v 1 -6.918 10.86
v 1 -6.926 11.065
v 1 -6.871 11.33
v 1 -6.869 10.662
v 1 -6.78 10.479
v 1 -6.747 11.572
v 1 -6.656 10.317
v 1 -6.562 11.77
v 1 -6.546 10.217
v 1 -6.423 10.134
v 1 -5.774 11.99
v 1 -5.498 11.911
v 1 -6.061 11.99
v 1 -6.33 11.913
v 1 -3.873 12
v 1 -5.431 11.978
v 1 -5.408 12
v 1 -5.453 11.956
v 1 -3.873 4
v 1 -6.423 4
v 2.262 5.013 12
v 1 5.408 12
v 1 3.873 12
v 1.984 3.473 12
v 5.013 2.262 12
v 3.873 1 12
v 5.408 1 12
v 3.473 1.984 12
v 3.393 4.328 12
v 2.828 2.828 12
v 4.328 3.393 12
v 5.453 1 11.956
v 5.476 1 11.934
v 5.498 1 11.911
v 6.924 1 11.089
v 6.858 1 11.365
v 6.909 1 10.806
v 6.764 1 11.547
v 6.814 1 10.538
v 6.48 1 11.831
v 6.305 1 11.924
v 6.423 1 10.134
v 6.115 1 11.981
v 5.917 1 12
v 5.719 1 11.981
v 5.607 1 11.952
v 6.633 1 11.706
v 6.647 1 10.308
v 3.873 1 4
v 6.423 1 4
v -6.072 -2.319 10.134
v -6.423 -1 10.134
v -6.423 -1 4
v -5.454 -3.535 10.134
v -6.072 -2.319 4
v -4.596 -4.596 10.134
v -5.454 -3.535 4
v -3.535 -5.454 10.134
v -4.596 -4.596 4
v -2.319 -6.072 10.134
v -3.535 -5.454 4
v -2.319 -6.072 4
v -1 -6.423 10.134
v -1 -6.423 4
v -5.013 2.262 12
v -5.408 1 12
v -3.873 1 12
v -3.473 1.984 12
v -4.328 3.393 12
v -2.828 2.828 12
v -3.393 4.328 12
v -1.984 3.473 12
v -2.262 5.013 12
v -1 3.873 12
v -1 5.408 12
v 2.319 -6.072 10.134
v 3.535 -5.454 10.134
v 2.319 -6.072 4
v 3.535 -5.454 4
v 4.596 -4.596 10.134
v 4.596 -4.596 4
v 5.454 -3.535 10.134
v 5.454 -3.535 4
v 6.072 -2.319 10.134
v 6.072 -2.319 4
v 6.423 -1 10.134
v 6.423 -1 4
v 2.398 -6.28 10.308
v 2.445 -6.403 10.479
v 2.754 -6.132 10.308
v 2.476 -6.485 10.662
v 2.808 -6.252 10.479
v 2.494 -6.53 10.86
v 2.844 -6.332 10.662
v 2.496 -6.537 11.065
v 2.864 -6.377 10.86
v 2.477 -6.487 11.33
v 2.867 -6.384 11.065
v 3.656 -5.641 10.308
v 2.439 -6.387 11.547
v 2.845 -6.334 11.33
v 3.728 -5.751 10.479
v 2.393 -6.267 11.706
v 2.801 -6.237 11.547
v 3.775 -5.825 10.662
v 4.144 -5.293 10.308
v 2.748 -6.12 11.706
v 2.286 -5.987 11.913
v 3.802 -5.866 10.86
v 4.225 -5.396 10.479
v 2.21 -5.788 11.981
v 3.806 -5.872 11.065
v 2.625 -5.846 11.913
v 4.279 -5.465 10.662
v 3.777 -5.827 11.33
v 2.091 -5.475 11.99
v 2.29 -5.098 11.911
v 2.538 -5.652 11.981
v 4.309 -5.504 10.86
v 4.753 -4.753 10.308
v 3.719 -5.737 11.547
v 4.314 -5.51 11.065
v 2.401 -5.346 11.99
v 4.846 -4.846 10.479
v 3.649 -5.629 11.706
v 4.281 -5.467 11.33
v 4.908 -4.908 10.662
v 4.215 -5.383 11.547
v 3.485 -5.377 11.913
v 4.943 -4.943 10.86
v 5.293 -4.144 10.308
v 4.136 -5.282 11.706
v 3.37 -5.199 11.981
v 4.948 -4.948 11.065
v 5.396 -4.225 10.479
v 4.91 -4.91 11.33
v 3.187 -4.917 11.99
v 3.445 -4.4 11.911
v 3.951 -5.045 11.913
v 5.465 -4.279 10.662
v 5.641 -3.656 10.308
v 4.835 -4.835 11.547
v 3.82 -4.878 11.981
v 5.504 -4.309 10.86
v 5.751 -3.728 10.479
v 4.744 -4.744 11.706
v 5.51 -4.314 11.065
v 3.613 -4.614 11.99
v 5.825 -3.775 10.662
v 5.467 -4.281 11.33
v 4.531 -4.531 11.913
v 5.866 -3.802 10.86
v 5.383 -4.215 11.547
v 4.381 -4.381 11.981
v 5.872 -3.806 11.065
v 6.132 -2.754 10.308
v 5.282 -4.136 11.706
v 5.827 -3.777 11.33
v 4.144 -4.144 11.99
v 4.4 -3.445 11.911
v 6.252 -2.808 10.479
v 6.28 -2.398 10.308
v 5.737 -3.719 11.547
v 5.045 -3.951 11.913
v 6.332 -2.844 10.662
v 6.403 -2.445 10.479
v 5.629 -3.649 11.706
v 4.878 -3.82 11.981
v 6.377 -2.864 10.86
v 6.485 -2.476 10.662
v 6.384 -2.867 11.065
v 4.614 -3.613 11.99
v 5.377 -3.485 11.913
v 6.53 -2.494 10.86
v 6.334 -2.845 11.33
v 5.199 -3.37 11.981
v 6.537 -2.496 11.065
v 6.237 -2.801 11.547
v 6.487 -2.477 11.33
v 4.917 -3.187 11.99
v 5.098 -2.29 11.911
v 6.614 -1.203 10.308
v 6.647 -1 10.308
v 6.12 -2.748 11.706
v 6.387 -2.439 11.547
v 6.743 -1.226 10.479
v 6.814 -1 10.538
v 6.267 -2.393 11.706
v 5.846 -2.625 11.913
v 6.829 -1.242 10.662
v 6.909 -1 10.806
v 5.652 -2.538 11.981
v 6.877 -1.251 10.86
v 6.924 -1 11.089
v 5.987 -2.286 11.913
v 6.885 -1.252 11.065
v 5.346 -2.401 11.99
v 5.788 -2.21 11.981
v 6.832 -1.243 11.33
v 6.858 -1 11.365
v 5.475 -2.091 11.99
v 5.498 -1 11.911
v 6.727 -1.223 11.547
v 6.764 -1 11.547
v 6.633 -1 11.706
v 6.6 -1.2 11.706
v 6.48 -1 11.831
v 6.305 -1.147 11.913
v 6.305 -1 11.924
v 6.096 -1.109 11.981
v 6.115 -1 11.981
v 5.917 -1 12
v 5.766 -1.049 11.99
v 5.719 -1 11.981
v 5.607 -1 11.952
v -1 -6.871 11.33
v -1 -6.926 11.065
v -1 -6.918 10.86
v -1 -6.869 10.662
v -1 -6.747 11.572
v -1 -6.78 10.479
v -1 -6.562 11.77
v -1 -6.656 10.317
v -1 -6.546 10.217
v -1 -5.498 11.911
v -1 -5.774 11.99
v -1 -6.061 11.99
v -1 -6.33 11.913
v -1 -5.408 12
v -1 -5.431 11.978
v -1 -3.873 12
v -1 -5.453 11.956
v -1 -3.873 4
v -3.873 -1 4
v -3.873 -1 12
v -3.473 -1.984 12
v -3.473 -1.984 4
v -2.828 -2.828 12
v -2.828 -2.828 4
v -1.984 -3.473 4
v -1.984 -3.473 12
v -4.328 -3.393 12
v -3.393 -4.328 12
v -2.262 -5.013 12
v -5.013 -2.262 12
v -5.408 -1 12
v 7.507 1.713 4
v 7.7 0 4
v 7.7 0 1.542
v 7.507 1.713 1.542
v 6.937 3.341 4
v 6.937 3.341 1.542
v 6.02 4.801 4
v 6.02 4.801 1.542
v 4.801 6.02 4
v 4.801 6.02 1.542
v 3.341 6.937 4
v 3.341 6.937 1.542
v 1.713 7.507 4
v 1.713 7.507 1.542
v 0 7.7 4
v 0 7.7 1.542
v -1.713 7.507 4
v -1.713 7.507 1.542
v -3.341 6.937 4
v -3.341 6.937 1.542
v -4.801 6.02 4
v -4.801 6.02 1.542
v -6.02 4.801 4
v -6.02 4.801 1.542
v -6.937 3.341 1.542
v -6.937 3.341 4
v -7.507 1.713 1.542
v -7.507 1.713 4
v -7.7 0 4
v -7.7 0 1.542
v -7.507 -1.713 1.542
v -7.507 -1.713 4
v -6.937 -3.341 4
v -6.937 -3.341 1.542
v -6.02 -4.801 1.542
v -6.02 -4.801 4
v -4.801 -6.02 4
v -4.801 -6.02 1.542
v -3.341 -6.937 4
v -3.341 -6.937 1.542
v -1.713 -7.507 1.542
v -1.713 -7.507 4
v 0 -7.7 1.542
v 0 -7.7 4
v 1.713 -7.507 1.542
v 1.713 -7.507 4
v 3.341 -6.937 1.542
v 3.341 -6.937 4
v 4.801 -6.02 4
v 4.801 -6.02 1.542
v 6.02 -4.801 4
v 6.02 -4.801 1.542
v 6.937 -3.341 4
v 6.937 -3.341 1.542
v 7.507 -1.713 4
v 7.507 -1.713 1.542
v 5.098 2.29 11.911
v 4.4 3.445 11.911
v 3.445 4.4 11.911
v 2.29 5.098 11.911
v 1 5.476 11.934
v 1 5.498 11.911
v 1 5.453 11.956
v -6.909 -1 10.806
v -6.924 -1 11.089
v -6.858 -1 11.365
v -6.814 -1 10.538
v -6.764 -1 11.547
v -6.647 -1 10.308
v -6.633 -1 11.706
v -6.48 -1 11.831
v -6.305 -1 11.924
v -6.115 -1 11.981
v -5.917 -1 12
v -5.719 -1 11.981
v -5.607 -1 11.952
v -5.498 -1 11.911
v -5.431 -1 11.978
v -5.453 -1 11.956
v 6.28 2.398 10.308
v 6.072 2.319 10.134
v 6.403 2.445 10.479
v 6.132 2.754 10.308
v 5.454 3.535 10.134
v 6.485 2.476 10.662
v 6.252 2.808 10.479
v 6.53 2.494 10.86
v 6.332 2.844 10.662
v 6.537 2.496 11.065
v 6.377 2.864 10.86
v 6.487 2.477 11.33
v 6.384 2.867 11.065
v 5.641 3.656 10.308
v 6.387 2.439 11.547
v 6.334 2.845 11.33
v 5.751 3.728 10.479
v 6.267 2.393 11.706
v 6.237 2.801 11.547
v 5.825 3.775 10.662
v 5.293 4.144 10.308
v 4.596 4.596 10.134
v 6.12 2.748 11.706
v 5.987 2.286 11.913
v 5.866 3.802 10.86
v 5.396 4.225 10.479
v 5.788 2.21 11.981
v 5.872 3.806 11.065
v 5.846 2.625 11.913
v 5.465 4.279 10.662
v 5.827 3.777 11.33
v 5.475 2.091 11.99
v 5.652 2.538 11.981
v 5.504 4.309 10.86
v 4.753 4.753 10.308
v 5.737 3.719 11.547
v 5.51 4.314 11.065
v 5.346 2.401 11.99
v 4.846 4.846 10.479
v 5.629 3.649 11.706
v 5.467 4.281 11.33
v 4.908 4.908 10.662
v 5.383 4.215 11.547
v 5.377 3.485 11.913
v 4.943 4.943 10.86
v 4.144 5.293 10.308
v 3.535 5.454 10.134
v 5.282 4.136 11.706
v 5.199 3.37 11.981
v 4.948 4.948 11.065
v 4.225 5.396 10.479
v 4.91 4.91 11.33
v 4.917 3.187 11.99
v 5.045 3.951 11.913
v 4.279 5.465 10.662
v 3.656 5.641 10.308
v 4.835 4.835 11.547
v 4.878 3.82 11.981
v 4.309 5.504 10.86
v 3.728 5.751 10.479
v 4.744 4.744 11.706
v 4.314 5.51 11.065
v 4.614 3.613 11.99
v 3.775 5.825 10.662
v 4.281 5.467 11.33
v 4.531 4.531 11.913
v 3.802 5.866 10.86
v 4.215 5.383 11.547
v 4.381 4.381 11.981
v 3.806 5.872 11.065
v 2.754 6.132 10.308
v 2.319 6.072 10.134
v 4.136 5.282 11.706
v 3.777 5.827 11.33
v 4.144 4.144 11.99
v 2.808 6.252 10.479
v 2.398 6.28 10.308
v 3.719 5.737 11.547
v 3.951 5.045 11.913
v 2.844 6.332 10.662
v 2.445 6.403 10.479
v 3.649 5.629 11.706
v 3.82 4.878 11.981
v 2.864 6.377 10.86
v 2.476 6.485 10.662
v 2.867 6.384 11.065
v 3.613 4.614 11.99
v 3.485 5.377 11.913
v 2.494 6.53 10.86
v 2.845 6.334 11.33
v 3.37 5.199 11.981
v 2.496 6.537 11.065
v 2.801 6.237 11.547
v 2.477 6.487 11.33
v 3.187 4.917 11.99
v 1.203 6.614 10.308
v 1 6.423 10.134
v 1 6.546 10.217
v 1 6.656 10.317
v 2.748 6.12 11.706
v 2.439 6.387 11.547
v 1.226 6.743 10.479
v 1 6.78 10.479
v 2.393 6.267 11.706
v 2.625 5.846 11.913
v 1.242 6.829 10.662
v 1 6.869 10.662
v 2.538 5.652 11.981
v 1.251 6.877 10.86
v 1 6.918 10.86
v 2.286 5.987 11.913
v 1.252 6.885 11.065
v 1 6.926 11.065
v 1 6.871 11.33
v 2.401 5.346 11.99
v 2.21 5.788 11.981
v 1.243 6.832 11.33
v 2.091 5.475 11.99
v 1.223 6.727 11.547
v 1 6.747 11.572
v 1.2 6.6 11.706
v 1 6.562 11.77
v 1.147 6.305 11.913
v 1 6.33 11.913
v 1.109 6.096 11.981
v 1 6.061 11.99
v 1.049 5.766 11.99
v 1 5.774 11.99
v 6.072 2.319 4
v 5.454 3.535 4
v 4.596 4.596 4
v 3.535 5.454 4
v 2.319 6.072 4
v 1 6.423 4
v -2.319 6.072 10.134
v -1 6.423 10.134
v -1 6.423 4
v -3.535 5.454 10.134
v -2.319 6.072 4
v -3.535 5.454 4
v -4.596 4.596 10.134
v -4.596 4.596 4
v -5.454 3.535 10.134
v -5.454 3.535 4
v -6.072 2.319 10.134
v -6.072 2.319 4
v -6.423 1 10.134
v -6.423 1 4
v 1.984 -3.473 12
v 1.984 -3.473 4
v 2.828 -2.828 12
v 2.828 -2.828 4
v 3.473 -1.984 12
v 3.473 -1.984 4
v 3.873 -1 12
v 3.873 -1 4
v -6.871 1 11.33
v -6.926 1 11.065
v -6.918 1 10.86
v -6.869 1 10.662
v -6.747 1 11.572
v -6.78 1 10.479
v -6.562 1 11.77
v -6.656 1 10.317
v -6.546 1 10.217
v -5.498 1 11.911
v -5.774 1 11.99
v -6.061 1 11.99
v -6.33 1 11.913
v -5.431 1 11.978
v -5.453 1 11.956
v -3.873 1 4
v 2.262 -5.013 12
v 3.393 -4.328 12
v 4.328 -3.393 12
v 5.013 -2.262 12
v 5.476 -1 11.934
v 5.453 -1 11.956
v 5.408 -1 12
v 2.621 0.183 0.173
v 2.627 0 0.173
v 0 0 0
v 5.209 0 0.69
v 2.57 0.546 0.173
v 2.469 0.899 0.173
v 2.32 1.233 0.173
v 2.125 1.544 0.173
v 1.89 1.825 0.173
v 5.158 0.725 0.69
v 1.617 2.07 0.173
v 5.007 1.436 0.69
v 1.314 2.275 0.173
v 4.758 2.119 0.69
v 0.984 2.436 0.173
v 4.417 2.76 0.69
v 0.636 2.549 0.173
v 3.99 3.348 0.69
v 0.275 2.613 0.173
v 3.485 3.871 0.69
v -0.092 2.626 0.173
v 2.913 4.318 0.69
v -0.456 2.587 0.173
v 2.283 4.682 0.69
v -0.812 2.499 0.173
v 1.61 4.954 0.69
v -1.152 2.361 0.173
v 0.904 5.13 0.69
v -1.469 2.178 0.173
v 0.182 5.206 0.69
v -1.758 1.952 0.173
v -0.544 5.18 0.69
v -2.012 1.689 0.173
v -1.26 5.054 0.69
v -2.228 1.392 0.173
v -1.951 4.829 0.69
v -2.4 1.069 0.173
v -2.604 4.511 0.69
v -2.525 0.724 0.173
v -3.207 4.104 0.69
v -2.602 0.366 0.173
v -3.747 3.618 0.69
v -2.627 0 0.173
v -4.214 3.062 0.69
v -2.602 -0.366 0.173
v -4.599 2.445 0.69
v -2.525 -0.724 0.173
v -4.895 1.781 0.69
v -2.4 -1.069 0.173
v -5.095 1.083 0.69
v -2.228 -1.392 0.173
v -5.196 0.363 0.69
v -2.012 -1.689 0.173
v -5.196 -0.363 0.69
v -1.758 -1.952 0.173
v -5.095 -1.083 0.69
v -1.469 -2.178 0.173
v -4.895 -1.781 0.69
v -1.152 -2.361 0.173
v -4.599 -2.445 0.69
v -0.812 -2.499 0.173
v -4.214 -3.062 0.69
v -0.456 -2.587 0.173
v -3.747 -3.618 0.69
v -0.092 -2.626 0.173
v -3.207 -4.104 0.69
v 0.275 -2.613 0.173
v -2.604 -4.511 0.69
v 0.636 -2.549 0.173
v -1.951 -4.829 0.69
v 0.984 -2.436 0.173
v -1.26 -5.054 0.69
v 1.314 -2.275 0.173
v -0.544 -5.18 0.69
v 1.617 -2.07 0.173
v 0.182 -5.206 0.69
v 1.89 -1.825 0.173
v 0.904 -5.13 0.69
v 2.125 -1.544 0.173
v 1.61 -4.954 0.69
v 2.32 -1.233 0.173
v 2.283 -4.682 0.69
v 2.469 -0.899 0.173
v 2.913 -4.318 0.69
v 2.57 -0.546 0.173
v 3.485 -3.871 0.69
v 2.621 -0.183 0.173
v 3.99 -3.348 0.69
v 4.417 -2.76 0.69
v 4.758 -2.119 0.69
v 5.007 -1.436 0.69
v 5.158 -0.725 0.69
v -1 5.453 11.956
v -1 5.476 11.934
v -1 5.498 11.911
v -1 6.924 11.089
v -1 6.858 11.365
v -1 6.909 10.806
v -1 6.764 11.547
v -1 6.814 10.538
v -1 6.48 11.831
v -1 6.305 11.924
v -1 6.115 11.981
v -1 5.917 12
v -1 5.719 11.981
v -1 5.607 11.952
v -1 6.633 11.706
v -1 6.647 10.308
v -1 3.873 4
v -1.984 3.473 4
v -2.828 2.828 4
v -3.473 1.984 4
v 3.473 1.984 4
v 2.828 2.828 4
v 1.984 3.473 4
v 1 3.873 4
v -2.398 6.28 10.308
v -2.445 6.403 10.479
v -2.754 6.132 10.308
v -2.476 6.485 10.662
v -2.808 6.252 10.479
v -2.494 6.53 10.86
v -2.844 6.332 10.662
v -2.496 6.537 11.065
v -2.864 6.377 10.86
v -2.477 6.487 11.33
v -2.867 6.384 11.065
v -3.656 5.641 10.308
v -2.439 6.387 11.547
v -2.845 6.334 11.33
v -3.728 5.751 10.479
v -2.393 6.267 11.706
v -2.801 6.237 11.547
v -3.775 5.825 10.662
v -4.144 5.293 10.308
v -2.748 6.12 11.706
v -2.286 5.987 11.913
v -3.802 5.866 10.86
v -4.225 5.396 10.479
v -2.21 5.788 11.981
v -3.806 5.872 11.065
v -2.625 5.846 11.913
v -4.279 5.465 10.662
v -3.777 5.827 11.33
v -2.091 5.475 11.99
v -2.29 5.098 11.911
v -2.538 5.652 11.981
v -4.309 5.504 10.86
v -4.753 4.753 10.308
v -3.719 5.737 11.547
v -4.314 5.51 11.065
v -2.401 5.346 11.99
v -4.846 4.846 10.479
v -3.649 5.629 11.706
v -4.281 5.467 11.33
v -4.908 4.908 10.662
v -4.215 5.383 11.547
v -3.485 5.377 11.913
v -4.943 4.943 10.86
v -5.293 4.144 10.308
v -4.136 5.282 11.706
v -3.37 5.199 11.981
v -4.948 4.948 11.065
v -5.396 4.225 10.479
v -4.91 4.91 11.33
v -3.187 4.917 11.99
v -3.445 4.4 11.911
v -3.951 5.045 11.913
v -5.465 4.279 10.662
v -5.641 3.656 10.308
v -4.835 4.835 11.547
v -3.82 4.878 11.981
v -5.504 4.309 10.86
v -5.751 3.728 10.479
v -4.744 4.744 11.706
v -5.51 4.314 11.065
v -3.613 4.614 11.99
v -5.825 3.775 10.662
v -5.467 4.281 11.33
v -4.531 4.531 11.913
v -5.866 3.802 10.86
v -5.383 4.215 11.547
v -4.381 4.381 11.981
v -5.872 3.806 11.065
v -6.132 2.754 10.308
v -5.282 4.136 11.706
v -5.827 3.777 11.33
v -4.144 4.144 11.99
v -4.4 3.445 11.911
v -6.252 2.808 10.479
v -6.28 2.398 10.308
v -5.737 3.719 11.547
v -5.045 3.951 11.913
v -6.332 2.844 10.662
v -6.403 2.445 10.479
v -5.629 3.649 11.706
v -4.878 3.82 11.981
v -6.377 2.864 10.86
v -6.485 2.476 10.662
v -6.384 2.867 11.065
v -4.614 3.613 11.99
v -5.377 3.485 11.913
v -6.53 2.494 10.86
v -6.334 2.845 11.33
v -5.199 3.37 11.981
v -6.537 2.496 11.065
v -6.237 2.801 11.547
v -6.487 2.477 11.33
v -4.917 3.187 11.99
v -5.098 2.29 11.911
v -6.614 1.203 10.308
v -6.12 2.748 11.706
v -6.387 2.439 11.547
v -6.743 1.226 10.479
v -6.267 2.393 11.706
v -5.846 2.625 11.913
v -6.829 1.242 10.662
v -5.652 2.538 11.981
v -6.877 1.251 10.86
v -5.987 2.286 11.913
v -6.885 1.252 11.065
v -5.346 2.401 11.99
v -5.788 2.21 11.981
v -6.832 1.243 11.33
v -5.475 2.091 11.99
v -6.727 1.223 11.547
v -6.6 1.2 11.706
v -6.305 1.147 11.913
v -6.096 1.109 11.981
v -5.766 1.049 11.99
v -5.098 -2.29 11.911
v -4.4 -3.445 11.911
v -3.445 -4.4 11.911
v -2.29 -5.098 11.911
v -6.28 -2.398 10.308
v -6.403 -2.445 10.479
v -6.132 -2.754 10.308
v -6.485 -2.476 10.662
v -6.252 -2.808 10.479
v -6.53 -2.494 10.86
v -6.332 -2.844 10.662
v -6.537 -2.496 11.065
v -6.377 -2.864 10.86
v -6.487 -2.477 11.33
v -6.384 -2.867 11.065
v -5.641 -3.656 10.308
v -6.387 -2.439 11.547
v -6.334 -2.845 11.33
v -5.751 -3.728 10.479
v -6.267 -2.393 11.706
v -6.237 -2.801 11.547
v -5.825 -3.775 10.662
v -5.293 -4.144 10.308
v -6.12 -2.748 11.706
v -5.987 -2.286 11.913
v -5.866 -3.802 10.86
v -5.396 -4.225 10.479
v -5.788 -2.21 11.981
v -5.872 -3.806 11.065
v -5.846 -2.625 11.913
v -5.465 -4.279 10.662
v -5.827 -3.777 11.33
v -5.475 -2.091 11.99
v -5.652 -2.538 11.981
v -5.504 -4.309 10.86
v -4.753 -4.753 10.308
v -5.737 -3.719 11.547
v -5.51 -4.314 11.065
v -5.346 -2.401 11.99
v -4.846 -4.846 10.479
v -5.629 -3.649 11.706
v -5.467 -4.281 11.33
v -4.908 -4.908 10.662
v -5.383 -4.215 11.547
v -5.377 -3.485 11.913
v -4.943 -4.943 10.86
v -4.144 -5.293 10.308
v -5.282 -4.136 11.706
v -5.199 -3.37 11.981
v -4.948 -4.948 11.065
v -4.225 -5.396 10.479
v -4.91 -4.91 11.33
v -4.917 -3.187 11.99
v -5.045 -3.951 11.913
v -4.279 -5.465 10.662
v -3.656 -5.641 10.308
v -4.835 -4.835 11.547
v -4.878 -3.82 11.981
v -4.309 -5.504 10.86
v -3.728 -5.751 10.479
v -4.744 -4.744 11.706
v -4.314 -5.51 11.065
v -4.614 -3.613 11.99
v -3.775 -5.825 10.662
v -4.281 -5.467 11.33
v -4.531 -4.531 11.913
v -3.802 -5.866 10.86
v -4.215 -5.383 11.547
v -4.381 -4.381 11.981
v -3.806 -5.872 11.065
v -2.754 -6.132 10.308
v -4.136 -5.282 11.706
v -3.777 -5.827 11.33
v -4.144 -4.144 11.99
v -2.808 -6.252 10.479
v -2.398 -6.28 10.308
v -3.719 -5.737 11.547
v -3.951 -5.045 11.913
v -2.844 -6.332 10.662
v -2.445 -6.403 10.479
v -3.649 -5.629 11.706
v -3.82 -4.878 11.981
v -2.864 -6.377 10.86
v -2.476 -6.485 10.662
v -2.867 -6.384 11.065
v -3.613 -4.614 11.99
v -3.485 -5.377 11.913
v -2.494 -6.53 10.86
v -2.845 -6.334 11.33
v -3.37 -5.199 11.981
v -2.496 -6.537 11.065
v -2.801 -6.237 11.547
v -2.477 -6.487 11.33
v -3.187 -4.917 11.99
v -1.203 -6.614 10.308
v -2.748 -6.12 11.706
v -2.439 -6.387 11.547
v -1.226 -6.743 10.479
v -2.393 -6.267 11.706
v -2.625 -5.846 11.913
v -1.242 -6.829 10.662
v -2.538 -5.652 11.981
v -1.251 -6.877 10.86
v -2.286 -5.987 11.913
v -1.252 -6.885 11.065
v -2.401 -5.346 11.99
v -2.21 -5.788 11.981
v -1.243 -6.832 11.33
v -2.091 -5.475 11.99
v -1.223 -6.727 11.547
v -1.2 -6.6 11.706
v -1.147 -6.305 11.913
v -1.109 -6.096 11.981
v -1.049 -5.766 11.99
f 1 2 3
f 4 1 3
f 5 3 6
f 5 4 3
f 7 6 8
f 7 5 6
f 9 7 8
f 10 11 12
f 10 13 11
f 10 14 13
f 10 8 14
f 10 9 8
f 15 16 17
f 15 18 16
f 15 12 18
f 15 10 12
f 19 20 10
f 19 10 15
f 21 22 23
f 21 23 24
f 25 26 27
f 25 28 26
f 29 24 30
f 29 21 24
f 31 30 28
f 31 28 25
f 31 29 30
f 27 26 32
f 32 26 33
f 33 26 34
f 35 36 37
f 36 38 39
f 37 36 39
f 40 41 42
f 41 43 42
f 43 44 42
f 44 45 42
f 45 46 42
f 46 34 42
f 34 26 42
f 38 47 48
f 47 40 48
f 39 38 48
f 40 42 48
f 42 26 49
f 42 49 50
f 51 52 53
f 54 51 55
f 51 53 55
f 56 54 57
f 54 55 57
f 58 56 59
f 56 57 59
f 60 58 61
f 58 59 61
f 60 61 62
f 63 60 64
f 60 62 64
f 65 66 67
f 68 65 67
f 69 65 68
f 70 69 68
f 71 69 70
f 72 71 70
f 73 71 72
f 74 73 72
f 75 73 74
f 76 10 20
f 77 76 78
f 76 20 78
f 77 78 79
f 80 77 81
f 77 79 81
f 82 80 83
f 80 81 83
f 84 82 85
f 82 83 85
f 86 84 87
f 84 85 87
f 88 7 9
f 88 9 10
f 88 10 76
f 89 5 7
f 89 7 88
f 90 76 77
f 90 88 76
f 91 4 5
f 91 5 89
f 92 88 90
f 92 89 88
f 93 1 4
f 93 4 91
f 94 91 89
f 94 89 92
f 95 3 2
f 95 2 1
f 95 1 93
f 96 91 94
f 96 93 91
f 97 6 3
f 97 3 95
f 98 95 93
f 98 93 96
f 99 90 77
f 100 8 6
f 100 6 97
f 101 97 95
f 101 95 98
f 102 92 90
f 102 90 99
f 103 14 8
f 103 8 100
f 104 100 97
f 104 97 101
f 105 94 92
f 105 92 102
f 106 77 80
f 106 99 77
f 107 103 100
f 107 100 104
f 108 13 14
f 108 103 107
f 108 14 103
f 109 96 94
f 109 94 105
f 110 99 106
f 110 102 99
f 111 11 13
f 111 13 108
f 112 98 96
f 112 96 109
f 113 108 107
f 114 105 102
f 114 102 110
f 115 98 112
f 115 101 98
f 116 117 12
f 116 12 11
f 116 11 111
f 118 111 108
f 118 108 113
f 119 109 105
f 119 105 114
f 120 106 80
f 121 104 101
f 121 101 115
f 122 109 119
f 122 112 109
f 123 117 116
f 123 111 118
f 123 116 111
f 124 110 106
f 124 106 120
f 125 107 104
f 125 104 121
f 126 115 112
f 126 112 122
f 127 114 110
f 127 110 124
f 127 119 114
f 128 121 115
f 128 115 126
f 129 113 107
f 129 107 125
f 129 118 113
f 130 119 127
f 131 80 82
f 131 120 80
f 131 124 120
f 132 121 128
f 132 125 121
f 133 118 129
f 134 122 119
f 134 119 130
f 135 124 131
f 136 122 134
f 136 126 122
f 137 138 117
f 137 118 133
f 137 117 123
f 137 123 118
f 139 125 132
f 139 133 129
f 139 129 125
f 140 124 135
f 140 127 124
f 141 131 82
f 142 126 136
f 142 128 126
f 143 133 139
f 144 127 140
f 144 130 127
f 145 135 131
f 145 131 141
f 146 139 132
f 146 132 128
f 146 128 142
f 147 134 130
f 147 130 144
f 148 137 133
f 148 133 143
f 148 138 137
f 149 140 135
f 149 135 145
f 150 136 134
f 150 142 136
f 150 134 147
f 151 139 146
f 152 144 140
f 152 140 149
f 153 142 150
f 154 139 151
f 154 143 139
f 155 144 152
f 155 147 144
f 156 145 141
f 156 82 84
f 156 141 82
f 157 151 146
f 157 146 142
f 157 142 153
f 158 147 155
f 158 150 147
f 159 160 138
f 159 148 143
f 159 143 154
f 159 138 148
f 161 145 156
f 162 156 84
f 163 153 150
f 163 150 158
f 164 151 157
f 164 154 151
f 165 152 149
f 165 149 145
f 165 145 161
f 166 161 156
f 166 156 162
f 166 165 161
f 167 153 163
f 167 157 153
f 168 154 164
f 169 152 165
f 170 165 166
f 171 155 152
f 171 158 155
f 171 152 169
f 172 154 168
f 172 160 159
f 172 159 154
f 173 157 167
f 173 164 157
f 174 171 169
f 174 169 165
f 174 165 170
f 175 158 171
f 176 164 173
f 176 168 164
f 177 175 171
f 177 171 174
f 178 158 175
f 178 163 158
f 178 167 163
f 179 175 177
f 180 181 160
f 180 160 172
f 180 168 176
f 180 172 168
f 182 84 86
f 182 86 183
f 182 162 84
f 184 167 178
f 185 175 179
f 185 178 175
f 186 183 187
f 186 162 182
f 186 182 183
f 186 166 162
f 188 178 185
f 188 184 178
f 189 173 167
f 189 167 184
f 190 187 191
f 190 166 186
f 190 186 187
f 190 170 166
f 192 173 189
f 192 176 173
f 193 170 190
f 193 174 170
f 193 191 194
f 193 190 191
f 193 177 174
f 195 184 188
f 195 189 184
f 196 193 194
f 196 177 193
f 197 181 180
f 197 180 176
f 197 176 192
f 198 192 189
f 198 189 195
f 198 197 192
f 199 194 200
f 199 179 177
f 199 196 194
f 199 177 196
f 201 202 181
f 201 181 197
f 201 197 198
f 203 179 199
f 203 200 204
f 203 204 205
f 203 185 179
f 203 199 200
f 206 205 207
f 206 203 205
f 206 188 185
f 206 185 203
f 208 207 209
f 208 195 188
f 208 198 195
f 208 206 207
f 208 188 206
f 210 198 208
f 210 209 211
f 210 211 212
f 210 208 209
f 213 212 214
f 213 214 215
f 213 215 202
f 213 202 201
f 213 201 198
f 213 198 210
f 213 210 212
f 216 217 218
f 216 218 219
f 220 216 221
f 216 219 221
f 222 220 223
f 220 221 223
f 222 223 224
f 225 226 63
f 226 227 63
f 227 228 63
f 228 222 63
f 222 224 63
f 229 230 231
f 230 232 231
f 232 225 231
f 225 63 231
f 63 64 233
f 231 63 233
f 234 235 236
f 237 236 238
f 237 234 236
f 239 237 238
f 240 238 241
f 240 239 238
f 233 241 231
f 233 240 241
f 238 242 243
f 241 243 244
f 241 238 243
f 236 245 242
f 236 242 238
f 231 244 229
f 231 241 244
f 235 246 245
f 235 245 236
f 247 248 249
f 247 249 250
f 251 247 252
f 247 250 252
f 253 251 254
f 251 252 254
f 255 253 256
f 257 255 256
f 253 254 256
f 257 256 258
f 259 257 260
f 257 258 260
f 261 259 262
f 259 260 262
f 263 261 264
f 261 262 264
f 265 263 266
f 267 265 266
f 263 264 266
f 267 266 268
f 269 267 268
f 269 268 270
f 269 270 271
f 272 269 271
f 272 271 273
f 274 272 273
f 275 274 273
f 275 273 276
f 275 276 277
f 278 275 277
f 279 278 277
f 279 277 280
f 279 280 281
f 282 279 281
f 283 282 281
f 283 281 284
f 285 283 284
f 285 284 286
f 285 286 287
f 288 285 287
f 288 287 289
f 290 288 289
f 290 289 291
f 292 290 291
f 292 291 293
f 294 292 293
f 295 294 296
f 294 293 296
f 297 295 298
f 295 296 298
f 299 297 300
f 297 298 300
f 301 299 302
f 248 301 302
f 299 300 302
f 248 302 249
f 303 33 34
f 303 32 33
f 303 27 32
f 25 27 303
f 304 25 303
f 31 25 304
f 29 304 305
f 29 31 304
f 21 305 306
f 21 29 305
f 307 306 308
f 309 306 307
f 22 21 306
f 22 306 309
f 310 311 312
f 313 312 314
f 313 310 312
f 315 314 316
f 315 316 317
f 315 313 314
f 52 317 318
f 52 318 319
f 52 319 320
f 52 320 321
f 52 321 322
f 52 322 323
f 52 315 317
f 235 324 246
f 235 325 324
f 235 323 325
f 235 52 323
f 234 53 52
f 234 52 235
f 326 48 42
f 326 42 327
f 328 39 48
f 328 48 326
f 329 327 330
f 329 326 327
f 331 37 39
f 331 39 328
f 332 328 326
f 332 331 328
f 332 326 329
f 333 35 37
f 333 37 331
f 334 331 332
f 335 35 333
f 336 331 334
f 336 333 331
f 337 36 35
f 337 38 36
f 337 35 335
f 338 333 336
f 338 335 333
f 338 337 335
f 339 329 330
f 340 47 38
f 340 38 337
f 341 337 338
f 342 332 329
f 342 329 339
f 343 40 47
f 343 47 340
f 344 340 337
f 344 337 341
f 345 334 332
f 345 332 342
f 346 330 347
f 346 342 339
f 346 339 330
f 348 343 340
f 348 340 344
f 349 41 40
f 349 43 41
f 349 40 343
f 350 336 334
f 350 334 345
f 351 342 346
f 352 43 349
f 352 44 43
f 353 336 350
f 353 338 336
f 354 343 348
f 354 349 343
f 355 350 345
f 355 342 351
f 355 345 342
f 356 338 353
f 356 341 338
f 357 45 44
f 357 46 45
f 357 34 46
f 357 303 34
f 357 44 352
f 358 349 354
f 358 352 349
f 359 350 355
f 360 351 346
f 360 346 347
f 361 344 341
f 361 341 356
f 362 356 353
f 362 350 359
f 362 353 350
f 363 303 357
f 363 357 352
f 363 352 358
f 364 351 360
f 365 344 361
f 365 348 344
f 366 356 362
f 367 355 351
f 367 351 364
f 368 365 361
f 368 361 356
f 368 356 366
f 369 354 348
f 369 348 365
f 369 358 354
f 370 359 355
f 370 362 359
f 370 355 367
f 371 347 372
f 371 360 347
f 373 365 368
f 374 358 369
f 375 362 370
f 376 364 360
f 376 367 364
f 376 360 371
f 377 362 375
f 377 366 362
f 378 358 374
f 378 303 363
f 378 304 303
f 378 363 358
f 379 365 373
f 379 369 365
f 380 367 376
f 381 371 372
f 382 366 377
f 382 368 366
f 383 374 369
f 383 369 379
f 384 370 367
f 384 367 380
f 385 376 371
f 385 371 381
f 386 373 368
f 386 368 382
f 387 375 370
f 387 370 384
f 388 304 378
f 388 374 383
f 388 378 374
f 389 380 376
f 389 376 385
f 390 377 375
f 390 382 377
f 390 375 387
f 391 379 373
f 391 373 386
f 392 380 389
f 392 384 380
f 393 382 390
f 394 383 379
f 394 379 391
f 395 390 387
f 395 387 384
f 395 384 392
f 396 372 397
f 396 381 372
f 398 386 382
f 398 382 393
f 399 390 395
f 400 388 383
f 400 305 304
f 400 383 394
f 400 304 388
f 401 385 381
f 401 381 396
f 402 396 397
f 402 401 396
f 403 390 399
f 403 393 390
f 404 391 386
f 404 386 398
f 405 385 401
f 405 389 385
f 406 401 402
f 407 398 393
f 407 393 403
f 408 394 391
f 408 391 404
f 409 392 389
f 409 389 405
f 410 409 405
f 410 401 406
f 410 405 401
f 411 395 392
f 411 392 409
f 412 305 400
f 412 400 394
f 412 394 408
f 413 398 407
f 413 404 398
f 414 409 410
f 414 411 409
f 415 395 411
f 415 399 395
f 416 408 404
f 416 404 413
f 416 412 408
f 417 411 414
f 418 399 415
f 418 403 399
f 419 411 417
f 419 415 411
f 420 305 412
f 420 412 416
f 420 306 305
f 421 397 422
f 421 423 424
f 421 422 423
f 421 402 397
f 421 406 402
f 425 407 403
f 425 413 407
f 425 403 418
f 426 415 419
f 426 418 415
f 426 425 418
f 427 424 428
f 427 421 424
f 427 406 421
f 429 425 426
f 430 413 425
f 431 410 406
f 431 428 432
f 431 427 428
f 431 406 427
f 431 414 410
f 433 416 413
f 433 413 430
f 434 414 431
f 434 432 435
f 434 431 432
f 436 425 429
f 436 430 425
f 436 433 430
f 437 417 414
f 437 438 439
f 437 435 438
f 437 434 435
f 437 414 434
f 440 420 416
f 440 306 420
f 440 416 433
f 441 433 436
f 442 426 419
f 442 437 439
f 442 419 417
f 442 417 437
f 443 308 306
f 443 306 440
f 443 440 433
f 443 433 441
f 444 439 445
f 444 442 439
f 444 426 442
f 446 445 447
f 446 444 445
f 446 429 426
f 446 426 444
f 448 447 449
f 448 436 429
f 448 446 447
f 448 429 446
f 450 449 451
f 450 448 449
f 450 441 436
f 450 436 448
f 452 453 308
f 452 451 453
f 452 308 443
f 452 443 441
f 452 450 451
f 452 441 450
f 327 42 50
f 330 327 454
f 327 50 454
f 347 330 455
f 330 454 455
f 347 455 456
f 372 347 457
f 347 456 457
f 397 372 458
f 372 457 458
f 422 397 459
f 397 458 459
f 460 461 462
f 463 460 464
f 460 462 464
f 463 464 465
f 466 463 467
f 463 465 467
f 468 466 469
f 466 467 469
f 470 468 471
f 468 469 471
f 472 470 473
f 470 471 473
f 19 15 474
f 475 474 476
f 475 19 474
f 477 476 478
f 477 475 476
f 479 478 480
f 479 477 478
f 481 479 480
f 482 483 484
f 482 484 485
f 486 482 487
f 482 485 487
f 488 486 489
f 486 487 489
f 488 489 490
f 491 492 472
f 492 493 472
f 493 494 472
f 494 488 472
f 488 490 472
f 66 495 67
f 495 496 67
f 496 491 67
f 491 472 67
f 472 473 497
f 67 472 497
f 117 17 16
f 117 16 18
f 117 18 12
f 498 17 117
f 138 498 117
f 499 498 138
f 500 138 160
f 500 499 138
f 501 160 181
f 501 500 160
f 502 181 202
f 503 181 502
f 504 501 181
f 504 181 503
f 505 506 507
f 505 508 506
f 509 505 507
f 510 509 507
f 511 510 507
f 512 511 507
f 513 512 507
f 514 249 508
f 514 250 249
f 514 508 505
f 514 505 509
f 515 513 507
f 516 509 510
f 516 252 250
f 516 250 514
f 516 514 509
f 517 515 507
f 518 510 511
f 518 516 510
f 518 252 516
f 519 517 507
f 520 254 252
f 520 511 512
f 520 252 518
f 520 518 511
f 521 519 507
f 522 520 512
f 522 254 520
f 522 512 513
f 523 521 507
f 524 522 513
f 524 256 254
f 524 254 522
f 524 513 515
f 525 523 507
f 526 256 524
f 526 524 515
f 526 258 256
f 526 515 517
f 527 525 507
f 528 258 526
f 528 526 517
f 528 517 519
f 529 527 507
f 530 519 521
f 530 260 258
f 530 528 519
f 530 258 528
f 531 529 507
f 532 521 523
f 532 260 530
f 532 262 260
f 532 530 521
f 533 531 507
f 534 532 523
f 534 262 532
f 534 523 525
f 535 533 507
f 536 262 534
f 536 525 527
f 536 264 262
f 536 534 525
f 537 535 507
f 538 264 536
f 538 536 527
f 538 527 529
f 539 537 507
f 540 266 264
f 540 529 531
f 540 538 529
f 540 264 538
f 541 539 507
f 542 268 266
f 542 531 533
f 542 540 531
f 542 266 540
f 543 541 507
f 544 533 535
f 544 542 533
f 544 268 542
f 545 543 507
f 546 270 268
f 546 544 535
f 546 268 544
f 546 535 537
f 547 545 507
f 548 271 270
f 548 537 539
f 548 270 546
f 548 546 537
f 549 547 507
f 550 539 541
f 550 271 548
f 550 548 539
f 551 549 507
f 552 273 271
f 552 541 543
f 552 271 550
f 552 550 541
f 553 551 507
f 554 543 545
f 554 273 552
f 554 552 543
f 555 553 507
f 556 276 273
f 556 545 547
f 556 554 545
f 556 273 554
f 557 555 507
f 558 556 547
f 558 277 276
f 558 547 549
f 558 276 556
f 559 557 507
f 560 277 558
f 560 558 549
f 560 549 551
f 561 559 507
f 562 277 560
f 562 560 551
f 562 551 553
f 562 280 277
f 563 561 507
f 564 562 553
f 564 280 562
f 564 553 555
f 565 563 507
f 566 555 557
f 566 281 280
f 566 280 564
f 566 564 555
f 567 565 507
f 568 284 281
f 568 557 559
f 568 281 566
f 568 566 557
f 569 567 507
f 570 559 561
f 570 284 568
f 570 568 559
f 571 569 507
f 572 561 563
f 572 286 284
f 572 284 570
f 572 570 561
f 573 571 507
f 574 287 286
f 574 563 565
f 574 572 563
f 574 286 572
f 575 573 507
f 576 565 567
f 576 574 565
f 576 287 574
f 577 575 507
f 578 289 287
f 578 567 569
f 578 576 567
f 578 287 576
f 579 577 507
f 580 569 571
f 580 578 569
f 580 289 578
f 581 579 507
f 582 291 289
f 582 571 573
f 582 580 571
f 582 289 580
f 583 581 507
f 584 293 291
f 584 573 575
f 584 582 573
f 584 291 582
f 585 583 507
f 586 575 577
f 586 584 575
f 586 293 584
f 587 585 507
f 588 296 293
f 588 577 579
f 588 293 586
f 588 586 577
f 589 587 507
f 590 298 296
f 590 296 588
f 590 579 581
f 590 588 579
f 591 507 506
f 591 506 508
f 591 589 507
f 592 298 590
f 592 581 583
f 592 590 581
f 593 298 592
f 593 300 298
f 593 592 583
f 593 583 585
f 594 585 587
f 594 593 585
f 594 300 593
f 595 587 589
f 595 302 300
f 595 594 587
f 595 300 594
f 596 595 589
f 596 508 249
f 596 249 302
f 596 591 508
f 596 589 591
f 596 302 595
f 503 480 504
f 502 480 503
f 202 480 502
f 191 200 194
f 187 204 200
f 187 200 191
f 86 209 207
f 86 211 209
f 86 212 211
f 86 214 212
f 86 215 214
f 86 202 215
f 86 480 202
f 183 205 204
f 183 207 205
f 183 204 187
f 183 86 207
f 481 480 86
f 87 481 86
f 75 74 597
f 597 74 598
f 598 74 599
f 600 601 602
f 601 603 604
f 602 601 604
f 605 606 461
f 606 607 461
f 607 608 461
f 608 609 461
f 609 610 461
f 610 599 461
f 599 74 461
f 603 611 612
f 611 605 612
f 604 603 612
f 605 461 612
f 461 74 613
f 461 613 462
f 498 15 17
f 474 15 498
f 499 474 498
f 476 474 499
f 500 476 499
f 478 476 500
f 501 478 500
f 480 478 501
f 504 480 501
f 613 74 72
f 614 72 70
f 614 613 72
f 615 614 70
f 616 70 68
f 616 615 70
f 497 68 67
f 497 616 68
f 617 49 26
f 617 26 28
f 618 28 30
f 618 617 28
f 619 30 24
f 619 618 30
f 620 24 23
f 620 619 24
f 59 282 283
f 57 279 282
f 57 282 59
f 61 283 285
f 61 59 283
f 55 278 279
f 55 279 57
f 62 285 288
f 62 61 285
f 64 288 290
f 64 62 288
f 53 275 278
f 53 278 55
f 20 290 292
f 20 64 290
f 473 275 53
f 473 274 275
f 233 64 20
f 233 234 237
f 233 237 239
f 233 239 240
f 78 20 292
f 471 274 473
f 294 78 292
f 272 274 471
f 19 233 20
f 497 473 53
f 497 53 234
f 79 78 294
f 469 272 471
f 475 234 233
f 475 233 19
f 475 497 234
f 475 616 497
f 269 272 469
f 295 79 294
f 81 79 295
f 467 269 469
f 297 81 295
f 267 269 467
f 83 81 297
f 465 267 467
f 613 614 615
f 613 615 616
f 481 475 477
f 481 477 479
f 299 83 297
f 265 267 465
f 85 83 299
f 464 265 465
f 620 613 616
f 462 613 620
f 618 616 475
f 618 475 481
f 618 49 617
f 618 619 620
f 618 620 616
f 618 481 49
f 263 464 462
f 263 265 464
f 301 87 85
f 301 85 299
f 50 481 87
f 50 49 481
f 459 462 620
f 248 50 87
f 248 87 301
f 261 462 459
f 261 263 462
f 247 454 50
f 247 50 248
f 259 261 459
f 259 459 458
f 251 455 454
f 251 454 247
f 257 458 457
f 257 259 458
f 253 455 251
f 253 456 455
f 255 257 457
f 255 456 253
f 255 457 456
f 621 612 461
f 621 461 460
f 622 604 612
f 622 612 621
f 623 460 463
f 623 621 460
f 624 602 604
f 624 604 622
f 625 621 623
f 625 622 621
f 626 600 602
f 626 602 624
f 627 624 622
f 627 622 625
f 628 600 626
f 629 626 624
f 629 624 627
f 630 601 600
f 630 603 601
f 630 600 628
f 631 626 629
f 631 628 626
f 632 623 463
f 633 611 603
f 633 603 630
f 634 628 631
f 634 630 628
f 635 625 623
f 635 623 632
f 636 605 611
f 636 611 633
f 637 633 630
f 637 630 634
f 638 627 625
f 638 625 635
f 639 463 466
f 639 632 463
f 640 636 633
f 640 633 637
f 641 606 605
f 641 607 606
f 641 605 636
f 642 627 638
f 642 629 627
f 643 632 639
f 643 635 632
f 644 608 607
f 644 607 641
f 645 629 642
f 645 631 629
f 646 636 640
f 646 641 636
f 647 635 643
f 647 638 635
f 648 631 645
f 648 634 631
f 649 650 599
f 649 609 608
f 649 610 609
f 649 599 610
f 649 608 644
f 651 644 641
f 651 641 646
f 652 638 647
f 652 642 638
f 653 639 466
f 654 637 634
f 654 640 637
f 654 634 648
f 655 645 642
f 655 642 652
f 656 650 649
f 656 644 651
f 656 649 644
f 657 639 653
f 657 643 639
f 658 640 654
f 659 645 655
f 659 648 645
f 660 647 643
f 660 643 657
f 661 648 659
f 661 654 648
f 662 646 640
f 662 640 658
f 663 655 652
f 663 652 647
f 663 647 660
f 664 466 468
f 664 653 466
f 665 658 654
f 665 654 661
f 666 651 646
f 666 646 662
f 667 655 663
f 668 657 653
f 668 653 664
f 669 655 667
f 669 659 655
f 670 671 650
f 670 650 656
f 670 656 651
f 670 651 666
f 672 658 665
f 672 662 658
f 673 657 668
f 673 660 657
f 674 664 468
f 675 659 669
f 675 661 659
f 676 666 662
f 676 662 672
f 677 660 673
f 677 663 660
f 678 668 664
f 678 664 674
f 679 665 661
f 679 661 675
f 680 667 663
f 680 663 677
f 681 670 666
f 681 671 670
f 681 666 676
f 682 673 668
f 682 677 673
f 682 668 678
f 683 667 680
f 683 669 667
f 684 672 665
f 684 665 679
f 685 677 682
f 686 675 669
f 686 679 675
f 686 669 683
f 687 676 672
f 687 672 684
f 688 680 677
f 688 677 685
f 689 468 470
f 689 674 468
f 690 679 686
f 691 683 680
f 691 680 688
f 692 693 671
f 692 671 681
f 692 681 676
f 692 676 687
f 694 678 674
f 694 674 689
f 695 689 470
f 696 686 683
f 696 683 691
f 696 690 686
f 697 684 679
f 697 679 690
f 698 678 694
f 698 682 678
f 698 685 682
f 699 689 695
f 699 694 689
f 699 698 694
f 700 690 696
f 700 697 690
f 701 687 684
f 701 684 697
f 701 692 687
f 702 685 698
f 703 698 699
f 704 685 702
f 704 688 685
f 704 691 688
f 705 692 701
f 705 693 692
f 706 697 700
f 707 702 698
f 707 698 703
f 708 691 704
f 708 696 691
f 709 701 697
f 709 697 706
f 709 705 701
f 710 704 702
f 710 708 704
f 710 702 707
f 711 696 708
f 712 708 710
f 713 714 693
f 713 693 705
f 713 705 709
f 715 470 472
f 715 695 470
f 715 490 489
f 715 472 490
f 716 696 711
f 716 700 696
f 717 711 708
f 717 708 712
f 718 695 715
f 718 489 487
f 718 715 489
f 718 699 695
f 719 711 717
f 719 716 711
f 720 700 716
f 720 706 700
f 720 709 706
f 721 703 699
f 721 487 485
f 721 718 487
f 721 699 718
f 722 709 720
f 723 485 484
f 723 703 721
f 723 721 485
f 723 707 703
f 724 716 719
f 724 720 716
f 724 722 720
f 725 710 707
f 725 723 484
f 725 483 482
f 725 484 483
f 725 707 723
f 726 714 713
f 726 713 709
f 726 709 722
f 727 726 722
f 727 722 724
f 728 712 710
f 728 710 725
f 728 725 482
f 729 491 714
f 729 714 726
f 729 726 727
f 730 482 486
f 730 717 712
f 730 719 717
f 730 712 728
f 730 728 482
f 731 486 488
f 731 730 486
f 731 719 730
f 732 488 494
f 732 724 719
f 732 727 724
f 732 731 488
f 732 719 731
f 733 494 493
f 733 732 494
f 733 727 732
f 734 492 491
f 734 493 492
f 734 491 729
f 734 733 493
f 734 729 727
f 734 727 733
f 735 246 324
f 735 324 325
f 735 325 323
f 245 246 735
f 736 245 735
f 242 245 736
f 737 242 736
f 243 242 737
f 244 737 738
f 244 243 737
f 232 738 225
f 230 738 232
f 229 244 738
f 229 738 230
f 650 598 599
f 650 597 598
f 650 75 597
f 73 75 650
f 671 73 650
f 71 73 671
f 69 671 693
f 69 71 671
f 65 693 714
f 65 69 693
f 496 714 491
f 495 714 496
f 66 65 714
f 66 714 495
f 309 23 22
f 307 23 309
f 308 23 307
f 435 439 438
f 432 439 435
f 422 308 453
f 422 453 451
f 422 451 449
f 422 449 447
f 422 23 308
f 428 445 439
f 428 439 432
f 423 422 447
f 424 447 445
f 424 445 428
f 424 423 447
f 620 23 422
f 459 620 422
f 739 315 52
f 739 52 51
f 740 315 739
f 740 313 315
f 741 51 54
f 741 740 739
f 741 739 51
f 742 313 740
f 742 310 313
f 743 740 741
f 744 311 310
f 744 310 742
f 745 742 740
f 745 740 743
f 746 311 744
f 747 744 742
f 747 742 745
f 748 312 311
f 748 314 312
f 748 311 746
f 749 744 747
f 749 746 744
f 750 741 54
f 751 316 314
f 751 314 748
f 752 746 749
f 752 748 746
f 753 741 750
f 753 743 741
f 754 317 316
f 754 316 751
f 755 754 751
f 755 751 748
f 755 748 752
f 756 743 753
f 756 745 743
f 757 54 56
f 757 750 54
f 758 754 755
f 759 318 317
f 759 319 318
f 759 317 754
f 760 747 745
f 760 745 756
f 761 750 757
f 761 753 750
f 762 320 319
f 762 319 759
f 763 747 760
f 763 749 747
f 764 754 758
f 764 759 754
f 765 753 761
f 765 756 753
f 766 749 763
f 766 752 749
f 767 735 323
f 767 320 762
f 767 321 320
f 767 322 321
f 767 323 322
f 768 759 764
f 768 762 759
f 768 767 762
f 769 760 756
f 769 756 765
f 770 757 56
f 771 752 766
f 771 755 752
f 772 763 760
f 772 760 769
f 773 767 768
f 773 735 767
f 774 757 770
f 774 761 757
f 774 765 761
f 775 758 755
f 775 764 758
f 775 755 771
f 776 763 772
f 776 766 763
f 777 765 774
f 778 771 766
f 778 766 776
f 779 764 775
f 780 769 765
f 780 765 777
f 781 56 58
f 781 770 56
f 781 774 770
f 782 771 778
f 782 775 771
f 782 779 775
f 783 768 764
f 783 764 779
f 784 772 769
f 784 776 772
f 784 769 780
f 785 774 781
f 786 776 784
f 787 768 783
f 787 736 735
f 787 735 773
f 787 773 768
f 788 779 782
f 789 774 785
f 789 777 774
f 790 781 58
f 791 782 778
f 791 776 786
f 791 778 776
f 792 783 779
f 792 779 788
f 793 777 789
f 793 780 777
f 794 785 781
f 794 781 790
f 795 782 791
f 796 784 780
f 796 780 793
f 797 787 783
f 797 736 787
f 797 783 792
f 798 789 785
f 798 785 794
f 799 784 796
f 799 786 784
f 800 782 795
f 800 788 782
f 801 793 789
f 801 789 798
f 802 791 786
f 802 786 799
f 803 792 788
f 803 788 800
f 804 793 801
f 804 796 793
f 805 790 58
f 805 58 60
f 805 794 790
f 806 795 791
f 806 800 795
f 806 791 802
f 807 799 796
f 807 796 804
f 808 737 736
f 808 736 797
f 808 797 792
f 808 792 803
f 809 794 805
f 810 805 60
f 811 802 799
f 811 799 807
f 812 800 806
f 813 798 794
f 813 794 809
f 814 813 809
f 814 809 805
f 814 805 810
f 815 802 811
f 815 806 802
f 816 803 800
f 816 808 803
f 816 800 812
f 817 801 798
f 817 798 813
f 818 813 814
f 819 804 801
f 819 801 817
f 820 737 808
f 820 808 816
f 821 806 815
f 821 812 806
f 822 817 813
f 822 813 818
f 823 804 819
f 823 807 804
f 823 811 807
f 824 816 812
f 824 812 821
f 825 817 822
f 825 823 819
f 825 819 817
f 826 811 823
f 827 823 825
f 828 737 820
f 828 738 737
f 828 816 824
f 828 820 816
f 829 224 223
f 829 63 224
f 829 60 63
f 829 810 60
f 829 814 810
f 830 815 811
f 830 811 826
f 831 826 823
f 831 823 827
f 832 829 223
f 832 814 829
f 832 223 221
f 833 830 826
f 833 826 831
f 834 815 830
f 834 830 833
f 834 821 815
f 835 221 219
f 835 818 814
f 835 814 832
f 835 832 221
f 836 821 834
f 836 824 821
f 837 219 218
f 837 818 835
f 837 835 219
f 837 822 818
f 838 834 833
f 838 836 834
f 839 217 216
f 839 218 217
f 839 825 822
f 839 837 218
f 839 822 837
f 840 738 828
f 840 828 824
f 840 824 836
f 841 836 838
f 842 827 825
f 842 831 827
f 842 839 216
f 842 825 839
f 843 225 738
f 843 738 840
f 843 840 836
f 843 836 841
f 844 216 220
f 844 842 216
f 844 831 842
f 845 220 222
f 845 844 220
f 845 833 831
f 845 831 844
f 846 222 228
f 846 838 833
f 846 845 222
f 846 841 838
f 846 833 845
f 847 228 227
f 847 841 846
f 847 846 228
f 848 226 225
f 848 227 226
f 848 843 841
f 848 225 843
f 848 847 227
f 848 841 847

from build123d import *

# Parameters (mm, degrees)
BOX001_W          = 20
BOX001_H          = 2
BOX001_DEPTH      = 10
BOX_W             = 2
BOX_H             = 20
BOX_DEPTH         = 10
CYLINDER002_R     = 4
CYLINDER002_DEPTH = 10
TORUS_R           = 1
CYLINDER001_R     = 6.5
CYLINDER001_DEPTH = 10
CYLINDER_R        = 7.7
CYLINDER_DEPTH    = 4
CHAMFER_SIZE      = 1


with BuildPart() as cube001:
    # Box001 → Box001 (new body)
    with BuildSketch(Plane(origin=(-10, -1, 4), x_dir=(1, 0, 0), z_dir=(0, 0, 1))):
        with Locations((10, 1)):
            Rectangle(BOX001_W, BOX001_H)
    extrude(amount=BOX001_DEPTH)


with BuildPart() as cube:
    # Box → Box (new body)
    with BuildSketch(Plane(origin=(-1, -10, 4), x_dir=(1, 0, 0), z_dir=(0, 0, 1))):
        with Locations((1, 10)):
            Rectangle(BOX_W, BOX_H)
    extrude(amount=BOX_DEPTH)


with BuildPart() as fusion002:
    # Cylinder002 → Cylinder002 (new body)
    with BuildSketch(Plane.XY.offset(4)):
        Circle(CYLINDER002_R)
    extrude(amount=CYLINDER002_DEPTH)

    # Fusion002: union Cube001, Cube
    add(cube001.part)
    add(cube.part)


with BuildPart() as torus:
    # Torus → Torus (revolve)
    with BuildSketch(Plane(origin=(0, 0, 11), x_dir=(1, 0, 0), z_dir=(0, -1, 0))):
        with Locations((6, 0)):
            Circle(TORUS_R)
    revolve(axis=Axis((0, 0, 11), (0, 0, 1)))


with BuildPart() as cylinder001:
    # Cylinder001 → Cylinder001 (new body)
    with BuildSketch(Plane.XY.offset(2)):
        Circle(CYLINDER001_R)
    extrude(amount=CYLINDER001_DEPTH)


with BuildPart() as cylinder:
    # Cylinder → Cylinder (new body)
    with BuildSketch(Plane.XY):
        Circle(CYLINDER_R)
    extrude(amount=CYLINDER_DEPTH)


with BuildPart() as stopa1:
    # Sphere → Sphere (revolve)
    with BuildSketch(Plane(origin=(0, 0, 20), x_dir=(1, 0, 0), z_dir=(0, -1, 0))):
        with BuildLine():
            ThreePointArc((0, -20), (20, 0), (0, 20))
            Line((0, 20), (0, -20))
        make_face()
    revolve(axis=Axis((0, 0, 20), (0, 0, 1)))

    # Common: intersect Cylinder
    add(cylinder.part, mode=Mode.INTERSECT)

    # Fusion: union Cylinder001
    add(cylinder001.part)

    # Chamfer
    chamfer_edges = [stopa1.edges().sort_by_distance(p)[0] for p in [
        (-6.5, 0, 12),
    ]]
    chamfer(chamfer_edges, length=CHAMFER_SIZE)

    # Fusion001: union Torus
    add(torus.part)

    # Cut: cut Fusion002
    add(fusion002.part, mode=Mode.SUBTRACT)


solid = stopa1.part
